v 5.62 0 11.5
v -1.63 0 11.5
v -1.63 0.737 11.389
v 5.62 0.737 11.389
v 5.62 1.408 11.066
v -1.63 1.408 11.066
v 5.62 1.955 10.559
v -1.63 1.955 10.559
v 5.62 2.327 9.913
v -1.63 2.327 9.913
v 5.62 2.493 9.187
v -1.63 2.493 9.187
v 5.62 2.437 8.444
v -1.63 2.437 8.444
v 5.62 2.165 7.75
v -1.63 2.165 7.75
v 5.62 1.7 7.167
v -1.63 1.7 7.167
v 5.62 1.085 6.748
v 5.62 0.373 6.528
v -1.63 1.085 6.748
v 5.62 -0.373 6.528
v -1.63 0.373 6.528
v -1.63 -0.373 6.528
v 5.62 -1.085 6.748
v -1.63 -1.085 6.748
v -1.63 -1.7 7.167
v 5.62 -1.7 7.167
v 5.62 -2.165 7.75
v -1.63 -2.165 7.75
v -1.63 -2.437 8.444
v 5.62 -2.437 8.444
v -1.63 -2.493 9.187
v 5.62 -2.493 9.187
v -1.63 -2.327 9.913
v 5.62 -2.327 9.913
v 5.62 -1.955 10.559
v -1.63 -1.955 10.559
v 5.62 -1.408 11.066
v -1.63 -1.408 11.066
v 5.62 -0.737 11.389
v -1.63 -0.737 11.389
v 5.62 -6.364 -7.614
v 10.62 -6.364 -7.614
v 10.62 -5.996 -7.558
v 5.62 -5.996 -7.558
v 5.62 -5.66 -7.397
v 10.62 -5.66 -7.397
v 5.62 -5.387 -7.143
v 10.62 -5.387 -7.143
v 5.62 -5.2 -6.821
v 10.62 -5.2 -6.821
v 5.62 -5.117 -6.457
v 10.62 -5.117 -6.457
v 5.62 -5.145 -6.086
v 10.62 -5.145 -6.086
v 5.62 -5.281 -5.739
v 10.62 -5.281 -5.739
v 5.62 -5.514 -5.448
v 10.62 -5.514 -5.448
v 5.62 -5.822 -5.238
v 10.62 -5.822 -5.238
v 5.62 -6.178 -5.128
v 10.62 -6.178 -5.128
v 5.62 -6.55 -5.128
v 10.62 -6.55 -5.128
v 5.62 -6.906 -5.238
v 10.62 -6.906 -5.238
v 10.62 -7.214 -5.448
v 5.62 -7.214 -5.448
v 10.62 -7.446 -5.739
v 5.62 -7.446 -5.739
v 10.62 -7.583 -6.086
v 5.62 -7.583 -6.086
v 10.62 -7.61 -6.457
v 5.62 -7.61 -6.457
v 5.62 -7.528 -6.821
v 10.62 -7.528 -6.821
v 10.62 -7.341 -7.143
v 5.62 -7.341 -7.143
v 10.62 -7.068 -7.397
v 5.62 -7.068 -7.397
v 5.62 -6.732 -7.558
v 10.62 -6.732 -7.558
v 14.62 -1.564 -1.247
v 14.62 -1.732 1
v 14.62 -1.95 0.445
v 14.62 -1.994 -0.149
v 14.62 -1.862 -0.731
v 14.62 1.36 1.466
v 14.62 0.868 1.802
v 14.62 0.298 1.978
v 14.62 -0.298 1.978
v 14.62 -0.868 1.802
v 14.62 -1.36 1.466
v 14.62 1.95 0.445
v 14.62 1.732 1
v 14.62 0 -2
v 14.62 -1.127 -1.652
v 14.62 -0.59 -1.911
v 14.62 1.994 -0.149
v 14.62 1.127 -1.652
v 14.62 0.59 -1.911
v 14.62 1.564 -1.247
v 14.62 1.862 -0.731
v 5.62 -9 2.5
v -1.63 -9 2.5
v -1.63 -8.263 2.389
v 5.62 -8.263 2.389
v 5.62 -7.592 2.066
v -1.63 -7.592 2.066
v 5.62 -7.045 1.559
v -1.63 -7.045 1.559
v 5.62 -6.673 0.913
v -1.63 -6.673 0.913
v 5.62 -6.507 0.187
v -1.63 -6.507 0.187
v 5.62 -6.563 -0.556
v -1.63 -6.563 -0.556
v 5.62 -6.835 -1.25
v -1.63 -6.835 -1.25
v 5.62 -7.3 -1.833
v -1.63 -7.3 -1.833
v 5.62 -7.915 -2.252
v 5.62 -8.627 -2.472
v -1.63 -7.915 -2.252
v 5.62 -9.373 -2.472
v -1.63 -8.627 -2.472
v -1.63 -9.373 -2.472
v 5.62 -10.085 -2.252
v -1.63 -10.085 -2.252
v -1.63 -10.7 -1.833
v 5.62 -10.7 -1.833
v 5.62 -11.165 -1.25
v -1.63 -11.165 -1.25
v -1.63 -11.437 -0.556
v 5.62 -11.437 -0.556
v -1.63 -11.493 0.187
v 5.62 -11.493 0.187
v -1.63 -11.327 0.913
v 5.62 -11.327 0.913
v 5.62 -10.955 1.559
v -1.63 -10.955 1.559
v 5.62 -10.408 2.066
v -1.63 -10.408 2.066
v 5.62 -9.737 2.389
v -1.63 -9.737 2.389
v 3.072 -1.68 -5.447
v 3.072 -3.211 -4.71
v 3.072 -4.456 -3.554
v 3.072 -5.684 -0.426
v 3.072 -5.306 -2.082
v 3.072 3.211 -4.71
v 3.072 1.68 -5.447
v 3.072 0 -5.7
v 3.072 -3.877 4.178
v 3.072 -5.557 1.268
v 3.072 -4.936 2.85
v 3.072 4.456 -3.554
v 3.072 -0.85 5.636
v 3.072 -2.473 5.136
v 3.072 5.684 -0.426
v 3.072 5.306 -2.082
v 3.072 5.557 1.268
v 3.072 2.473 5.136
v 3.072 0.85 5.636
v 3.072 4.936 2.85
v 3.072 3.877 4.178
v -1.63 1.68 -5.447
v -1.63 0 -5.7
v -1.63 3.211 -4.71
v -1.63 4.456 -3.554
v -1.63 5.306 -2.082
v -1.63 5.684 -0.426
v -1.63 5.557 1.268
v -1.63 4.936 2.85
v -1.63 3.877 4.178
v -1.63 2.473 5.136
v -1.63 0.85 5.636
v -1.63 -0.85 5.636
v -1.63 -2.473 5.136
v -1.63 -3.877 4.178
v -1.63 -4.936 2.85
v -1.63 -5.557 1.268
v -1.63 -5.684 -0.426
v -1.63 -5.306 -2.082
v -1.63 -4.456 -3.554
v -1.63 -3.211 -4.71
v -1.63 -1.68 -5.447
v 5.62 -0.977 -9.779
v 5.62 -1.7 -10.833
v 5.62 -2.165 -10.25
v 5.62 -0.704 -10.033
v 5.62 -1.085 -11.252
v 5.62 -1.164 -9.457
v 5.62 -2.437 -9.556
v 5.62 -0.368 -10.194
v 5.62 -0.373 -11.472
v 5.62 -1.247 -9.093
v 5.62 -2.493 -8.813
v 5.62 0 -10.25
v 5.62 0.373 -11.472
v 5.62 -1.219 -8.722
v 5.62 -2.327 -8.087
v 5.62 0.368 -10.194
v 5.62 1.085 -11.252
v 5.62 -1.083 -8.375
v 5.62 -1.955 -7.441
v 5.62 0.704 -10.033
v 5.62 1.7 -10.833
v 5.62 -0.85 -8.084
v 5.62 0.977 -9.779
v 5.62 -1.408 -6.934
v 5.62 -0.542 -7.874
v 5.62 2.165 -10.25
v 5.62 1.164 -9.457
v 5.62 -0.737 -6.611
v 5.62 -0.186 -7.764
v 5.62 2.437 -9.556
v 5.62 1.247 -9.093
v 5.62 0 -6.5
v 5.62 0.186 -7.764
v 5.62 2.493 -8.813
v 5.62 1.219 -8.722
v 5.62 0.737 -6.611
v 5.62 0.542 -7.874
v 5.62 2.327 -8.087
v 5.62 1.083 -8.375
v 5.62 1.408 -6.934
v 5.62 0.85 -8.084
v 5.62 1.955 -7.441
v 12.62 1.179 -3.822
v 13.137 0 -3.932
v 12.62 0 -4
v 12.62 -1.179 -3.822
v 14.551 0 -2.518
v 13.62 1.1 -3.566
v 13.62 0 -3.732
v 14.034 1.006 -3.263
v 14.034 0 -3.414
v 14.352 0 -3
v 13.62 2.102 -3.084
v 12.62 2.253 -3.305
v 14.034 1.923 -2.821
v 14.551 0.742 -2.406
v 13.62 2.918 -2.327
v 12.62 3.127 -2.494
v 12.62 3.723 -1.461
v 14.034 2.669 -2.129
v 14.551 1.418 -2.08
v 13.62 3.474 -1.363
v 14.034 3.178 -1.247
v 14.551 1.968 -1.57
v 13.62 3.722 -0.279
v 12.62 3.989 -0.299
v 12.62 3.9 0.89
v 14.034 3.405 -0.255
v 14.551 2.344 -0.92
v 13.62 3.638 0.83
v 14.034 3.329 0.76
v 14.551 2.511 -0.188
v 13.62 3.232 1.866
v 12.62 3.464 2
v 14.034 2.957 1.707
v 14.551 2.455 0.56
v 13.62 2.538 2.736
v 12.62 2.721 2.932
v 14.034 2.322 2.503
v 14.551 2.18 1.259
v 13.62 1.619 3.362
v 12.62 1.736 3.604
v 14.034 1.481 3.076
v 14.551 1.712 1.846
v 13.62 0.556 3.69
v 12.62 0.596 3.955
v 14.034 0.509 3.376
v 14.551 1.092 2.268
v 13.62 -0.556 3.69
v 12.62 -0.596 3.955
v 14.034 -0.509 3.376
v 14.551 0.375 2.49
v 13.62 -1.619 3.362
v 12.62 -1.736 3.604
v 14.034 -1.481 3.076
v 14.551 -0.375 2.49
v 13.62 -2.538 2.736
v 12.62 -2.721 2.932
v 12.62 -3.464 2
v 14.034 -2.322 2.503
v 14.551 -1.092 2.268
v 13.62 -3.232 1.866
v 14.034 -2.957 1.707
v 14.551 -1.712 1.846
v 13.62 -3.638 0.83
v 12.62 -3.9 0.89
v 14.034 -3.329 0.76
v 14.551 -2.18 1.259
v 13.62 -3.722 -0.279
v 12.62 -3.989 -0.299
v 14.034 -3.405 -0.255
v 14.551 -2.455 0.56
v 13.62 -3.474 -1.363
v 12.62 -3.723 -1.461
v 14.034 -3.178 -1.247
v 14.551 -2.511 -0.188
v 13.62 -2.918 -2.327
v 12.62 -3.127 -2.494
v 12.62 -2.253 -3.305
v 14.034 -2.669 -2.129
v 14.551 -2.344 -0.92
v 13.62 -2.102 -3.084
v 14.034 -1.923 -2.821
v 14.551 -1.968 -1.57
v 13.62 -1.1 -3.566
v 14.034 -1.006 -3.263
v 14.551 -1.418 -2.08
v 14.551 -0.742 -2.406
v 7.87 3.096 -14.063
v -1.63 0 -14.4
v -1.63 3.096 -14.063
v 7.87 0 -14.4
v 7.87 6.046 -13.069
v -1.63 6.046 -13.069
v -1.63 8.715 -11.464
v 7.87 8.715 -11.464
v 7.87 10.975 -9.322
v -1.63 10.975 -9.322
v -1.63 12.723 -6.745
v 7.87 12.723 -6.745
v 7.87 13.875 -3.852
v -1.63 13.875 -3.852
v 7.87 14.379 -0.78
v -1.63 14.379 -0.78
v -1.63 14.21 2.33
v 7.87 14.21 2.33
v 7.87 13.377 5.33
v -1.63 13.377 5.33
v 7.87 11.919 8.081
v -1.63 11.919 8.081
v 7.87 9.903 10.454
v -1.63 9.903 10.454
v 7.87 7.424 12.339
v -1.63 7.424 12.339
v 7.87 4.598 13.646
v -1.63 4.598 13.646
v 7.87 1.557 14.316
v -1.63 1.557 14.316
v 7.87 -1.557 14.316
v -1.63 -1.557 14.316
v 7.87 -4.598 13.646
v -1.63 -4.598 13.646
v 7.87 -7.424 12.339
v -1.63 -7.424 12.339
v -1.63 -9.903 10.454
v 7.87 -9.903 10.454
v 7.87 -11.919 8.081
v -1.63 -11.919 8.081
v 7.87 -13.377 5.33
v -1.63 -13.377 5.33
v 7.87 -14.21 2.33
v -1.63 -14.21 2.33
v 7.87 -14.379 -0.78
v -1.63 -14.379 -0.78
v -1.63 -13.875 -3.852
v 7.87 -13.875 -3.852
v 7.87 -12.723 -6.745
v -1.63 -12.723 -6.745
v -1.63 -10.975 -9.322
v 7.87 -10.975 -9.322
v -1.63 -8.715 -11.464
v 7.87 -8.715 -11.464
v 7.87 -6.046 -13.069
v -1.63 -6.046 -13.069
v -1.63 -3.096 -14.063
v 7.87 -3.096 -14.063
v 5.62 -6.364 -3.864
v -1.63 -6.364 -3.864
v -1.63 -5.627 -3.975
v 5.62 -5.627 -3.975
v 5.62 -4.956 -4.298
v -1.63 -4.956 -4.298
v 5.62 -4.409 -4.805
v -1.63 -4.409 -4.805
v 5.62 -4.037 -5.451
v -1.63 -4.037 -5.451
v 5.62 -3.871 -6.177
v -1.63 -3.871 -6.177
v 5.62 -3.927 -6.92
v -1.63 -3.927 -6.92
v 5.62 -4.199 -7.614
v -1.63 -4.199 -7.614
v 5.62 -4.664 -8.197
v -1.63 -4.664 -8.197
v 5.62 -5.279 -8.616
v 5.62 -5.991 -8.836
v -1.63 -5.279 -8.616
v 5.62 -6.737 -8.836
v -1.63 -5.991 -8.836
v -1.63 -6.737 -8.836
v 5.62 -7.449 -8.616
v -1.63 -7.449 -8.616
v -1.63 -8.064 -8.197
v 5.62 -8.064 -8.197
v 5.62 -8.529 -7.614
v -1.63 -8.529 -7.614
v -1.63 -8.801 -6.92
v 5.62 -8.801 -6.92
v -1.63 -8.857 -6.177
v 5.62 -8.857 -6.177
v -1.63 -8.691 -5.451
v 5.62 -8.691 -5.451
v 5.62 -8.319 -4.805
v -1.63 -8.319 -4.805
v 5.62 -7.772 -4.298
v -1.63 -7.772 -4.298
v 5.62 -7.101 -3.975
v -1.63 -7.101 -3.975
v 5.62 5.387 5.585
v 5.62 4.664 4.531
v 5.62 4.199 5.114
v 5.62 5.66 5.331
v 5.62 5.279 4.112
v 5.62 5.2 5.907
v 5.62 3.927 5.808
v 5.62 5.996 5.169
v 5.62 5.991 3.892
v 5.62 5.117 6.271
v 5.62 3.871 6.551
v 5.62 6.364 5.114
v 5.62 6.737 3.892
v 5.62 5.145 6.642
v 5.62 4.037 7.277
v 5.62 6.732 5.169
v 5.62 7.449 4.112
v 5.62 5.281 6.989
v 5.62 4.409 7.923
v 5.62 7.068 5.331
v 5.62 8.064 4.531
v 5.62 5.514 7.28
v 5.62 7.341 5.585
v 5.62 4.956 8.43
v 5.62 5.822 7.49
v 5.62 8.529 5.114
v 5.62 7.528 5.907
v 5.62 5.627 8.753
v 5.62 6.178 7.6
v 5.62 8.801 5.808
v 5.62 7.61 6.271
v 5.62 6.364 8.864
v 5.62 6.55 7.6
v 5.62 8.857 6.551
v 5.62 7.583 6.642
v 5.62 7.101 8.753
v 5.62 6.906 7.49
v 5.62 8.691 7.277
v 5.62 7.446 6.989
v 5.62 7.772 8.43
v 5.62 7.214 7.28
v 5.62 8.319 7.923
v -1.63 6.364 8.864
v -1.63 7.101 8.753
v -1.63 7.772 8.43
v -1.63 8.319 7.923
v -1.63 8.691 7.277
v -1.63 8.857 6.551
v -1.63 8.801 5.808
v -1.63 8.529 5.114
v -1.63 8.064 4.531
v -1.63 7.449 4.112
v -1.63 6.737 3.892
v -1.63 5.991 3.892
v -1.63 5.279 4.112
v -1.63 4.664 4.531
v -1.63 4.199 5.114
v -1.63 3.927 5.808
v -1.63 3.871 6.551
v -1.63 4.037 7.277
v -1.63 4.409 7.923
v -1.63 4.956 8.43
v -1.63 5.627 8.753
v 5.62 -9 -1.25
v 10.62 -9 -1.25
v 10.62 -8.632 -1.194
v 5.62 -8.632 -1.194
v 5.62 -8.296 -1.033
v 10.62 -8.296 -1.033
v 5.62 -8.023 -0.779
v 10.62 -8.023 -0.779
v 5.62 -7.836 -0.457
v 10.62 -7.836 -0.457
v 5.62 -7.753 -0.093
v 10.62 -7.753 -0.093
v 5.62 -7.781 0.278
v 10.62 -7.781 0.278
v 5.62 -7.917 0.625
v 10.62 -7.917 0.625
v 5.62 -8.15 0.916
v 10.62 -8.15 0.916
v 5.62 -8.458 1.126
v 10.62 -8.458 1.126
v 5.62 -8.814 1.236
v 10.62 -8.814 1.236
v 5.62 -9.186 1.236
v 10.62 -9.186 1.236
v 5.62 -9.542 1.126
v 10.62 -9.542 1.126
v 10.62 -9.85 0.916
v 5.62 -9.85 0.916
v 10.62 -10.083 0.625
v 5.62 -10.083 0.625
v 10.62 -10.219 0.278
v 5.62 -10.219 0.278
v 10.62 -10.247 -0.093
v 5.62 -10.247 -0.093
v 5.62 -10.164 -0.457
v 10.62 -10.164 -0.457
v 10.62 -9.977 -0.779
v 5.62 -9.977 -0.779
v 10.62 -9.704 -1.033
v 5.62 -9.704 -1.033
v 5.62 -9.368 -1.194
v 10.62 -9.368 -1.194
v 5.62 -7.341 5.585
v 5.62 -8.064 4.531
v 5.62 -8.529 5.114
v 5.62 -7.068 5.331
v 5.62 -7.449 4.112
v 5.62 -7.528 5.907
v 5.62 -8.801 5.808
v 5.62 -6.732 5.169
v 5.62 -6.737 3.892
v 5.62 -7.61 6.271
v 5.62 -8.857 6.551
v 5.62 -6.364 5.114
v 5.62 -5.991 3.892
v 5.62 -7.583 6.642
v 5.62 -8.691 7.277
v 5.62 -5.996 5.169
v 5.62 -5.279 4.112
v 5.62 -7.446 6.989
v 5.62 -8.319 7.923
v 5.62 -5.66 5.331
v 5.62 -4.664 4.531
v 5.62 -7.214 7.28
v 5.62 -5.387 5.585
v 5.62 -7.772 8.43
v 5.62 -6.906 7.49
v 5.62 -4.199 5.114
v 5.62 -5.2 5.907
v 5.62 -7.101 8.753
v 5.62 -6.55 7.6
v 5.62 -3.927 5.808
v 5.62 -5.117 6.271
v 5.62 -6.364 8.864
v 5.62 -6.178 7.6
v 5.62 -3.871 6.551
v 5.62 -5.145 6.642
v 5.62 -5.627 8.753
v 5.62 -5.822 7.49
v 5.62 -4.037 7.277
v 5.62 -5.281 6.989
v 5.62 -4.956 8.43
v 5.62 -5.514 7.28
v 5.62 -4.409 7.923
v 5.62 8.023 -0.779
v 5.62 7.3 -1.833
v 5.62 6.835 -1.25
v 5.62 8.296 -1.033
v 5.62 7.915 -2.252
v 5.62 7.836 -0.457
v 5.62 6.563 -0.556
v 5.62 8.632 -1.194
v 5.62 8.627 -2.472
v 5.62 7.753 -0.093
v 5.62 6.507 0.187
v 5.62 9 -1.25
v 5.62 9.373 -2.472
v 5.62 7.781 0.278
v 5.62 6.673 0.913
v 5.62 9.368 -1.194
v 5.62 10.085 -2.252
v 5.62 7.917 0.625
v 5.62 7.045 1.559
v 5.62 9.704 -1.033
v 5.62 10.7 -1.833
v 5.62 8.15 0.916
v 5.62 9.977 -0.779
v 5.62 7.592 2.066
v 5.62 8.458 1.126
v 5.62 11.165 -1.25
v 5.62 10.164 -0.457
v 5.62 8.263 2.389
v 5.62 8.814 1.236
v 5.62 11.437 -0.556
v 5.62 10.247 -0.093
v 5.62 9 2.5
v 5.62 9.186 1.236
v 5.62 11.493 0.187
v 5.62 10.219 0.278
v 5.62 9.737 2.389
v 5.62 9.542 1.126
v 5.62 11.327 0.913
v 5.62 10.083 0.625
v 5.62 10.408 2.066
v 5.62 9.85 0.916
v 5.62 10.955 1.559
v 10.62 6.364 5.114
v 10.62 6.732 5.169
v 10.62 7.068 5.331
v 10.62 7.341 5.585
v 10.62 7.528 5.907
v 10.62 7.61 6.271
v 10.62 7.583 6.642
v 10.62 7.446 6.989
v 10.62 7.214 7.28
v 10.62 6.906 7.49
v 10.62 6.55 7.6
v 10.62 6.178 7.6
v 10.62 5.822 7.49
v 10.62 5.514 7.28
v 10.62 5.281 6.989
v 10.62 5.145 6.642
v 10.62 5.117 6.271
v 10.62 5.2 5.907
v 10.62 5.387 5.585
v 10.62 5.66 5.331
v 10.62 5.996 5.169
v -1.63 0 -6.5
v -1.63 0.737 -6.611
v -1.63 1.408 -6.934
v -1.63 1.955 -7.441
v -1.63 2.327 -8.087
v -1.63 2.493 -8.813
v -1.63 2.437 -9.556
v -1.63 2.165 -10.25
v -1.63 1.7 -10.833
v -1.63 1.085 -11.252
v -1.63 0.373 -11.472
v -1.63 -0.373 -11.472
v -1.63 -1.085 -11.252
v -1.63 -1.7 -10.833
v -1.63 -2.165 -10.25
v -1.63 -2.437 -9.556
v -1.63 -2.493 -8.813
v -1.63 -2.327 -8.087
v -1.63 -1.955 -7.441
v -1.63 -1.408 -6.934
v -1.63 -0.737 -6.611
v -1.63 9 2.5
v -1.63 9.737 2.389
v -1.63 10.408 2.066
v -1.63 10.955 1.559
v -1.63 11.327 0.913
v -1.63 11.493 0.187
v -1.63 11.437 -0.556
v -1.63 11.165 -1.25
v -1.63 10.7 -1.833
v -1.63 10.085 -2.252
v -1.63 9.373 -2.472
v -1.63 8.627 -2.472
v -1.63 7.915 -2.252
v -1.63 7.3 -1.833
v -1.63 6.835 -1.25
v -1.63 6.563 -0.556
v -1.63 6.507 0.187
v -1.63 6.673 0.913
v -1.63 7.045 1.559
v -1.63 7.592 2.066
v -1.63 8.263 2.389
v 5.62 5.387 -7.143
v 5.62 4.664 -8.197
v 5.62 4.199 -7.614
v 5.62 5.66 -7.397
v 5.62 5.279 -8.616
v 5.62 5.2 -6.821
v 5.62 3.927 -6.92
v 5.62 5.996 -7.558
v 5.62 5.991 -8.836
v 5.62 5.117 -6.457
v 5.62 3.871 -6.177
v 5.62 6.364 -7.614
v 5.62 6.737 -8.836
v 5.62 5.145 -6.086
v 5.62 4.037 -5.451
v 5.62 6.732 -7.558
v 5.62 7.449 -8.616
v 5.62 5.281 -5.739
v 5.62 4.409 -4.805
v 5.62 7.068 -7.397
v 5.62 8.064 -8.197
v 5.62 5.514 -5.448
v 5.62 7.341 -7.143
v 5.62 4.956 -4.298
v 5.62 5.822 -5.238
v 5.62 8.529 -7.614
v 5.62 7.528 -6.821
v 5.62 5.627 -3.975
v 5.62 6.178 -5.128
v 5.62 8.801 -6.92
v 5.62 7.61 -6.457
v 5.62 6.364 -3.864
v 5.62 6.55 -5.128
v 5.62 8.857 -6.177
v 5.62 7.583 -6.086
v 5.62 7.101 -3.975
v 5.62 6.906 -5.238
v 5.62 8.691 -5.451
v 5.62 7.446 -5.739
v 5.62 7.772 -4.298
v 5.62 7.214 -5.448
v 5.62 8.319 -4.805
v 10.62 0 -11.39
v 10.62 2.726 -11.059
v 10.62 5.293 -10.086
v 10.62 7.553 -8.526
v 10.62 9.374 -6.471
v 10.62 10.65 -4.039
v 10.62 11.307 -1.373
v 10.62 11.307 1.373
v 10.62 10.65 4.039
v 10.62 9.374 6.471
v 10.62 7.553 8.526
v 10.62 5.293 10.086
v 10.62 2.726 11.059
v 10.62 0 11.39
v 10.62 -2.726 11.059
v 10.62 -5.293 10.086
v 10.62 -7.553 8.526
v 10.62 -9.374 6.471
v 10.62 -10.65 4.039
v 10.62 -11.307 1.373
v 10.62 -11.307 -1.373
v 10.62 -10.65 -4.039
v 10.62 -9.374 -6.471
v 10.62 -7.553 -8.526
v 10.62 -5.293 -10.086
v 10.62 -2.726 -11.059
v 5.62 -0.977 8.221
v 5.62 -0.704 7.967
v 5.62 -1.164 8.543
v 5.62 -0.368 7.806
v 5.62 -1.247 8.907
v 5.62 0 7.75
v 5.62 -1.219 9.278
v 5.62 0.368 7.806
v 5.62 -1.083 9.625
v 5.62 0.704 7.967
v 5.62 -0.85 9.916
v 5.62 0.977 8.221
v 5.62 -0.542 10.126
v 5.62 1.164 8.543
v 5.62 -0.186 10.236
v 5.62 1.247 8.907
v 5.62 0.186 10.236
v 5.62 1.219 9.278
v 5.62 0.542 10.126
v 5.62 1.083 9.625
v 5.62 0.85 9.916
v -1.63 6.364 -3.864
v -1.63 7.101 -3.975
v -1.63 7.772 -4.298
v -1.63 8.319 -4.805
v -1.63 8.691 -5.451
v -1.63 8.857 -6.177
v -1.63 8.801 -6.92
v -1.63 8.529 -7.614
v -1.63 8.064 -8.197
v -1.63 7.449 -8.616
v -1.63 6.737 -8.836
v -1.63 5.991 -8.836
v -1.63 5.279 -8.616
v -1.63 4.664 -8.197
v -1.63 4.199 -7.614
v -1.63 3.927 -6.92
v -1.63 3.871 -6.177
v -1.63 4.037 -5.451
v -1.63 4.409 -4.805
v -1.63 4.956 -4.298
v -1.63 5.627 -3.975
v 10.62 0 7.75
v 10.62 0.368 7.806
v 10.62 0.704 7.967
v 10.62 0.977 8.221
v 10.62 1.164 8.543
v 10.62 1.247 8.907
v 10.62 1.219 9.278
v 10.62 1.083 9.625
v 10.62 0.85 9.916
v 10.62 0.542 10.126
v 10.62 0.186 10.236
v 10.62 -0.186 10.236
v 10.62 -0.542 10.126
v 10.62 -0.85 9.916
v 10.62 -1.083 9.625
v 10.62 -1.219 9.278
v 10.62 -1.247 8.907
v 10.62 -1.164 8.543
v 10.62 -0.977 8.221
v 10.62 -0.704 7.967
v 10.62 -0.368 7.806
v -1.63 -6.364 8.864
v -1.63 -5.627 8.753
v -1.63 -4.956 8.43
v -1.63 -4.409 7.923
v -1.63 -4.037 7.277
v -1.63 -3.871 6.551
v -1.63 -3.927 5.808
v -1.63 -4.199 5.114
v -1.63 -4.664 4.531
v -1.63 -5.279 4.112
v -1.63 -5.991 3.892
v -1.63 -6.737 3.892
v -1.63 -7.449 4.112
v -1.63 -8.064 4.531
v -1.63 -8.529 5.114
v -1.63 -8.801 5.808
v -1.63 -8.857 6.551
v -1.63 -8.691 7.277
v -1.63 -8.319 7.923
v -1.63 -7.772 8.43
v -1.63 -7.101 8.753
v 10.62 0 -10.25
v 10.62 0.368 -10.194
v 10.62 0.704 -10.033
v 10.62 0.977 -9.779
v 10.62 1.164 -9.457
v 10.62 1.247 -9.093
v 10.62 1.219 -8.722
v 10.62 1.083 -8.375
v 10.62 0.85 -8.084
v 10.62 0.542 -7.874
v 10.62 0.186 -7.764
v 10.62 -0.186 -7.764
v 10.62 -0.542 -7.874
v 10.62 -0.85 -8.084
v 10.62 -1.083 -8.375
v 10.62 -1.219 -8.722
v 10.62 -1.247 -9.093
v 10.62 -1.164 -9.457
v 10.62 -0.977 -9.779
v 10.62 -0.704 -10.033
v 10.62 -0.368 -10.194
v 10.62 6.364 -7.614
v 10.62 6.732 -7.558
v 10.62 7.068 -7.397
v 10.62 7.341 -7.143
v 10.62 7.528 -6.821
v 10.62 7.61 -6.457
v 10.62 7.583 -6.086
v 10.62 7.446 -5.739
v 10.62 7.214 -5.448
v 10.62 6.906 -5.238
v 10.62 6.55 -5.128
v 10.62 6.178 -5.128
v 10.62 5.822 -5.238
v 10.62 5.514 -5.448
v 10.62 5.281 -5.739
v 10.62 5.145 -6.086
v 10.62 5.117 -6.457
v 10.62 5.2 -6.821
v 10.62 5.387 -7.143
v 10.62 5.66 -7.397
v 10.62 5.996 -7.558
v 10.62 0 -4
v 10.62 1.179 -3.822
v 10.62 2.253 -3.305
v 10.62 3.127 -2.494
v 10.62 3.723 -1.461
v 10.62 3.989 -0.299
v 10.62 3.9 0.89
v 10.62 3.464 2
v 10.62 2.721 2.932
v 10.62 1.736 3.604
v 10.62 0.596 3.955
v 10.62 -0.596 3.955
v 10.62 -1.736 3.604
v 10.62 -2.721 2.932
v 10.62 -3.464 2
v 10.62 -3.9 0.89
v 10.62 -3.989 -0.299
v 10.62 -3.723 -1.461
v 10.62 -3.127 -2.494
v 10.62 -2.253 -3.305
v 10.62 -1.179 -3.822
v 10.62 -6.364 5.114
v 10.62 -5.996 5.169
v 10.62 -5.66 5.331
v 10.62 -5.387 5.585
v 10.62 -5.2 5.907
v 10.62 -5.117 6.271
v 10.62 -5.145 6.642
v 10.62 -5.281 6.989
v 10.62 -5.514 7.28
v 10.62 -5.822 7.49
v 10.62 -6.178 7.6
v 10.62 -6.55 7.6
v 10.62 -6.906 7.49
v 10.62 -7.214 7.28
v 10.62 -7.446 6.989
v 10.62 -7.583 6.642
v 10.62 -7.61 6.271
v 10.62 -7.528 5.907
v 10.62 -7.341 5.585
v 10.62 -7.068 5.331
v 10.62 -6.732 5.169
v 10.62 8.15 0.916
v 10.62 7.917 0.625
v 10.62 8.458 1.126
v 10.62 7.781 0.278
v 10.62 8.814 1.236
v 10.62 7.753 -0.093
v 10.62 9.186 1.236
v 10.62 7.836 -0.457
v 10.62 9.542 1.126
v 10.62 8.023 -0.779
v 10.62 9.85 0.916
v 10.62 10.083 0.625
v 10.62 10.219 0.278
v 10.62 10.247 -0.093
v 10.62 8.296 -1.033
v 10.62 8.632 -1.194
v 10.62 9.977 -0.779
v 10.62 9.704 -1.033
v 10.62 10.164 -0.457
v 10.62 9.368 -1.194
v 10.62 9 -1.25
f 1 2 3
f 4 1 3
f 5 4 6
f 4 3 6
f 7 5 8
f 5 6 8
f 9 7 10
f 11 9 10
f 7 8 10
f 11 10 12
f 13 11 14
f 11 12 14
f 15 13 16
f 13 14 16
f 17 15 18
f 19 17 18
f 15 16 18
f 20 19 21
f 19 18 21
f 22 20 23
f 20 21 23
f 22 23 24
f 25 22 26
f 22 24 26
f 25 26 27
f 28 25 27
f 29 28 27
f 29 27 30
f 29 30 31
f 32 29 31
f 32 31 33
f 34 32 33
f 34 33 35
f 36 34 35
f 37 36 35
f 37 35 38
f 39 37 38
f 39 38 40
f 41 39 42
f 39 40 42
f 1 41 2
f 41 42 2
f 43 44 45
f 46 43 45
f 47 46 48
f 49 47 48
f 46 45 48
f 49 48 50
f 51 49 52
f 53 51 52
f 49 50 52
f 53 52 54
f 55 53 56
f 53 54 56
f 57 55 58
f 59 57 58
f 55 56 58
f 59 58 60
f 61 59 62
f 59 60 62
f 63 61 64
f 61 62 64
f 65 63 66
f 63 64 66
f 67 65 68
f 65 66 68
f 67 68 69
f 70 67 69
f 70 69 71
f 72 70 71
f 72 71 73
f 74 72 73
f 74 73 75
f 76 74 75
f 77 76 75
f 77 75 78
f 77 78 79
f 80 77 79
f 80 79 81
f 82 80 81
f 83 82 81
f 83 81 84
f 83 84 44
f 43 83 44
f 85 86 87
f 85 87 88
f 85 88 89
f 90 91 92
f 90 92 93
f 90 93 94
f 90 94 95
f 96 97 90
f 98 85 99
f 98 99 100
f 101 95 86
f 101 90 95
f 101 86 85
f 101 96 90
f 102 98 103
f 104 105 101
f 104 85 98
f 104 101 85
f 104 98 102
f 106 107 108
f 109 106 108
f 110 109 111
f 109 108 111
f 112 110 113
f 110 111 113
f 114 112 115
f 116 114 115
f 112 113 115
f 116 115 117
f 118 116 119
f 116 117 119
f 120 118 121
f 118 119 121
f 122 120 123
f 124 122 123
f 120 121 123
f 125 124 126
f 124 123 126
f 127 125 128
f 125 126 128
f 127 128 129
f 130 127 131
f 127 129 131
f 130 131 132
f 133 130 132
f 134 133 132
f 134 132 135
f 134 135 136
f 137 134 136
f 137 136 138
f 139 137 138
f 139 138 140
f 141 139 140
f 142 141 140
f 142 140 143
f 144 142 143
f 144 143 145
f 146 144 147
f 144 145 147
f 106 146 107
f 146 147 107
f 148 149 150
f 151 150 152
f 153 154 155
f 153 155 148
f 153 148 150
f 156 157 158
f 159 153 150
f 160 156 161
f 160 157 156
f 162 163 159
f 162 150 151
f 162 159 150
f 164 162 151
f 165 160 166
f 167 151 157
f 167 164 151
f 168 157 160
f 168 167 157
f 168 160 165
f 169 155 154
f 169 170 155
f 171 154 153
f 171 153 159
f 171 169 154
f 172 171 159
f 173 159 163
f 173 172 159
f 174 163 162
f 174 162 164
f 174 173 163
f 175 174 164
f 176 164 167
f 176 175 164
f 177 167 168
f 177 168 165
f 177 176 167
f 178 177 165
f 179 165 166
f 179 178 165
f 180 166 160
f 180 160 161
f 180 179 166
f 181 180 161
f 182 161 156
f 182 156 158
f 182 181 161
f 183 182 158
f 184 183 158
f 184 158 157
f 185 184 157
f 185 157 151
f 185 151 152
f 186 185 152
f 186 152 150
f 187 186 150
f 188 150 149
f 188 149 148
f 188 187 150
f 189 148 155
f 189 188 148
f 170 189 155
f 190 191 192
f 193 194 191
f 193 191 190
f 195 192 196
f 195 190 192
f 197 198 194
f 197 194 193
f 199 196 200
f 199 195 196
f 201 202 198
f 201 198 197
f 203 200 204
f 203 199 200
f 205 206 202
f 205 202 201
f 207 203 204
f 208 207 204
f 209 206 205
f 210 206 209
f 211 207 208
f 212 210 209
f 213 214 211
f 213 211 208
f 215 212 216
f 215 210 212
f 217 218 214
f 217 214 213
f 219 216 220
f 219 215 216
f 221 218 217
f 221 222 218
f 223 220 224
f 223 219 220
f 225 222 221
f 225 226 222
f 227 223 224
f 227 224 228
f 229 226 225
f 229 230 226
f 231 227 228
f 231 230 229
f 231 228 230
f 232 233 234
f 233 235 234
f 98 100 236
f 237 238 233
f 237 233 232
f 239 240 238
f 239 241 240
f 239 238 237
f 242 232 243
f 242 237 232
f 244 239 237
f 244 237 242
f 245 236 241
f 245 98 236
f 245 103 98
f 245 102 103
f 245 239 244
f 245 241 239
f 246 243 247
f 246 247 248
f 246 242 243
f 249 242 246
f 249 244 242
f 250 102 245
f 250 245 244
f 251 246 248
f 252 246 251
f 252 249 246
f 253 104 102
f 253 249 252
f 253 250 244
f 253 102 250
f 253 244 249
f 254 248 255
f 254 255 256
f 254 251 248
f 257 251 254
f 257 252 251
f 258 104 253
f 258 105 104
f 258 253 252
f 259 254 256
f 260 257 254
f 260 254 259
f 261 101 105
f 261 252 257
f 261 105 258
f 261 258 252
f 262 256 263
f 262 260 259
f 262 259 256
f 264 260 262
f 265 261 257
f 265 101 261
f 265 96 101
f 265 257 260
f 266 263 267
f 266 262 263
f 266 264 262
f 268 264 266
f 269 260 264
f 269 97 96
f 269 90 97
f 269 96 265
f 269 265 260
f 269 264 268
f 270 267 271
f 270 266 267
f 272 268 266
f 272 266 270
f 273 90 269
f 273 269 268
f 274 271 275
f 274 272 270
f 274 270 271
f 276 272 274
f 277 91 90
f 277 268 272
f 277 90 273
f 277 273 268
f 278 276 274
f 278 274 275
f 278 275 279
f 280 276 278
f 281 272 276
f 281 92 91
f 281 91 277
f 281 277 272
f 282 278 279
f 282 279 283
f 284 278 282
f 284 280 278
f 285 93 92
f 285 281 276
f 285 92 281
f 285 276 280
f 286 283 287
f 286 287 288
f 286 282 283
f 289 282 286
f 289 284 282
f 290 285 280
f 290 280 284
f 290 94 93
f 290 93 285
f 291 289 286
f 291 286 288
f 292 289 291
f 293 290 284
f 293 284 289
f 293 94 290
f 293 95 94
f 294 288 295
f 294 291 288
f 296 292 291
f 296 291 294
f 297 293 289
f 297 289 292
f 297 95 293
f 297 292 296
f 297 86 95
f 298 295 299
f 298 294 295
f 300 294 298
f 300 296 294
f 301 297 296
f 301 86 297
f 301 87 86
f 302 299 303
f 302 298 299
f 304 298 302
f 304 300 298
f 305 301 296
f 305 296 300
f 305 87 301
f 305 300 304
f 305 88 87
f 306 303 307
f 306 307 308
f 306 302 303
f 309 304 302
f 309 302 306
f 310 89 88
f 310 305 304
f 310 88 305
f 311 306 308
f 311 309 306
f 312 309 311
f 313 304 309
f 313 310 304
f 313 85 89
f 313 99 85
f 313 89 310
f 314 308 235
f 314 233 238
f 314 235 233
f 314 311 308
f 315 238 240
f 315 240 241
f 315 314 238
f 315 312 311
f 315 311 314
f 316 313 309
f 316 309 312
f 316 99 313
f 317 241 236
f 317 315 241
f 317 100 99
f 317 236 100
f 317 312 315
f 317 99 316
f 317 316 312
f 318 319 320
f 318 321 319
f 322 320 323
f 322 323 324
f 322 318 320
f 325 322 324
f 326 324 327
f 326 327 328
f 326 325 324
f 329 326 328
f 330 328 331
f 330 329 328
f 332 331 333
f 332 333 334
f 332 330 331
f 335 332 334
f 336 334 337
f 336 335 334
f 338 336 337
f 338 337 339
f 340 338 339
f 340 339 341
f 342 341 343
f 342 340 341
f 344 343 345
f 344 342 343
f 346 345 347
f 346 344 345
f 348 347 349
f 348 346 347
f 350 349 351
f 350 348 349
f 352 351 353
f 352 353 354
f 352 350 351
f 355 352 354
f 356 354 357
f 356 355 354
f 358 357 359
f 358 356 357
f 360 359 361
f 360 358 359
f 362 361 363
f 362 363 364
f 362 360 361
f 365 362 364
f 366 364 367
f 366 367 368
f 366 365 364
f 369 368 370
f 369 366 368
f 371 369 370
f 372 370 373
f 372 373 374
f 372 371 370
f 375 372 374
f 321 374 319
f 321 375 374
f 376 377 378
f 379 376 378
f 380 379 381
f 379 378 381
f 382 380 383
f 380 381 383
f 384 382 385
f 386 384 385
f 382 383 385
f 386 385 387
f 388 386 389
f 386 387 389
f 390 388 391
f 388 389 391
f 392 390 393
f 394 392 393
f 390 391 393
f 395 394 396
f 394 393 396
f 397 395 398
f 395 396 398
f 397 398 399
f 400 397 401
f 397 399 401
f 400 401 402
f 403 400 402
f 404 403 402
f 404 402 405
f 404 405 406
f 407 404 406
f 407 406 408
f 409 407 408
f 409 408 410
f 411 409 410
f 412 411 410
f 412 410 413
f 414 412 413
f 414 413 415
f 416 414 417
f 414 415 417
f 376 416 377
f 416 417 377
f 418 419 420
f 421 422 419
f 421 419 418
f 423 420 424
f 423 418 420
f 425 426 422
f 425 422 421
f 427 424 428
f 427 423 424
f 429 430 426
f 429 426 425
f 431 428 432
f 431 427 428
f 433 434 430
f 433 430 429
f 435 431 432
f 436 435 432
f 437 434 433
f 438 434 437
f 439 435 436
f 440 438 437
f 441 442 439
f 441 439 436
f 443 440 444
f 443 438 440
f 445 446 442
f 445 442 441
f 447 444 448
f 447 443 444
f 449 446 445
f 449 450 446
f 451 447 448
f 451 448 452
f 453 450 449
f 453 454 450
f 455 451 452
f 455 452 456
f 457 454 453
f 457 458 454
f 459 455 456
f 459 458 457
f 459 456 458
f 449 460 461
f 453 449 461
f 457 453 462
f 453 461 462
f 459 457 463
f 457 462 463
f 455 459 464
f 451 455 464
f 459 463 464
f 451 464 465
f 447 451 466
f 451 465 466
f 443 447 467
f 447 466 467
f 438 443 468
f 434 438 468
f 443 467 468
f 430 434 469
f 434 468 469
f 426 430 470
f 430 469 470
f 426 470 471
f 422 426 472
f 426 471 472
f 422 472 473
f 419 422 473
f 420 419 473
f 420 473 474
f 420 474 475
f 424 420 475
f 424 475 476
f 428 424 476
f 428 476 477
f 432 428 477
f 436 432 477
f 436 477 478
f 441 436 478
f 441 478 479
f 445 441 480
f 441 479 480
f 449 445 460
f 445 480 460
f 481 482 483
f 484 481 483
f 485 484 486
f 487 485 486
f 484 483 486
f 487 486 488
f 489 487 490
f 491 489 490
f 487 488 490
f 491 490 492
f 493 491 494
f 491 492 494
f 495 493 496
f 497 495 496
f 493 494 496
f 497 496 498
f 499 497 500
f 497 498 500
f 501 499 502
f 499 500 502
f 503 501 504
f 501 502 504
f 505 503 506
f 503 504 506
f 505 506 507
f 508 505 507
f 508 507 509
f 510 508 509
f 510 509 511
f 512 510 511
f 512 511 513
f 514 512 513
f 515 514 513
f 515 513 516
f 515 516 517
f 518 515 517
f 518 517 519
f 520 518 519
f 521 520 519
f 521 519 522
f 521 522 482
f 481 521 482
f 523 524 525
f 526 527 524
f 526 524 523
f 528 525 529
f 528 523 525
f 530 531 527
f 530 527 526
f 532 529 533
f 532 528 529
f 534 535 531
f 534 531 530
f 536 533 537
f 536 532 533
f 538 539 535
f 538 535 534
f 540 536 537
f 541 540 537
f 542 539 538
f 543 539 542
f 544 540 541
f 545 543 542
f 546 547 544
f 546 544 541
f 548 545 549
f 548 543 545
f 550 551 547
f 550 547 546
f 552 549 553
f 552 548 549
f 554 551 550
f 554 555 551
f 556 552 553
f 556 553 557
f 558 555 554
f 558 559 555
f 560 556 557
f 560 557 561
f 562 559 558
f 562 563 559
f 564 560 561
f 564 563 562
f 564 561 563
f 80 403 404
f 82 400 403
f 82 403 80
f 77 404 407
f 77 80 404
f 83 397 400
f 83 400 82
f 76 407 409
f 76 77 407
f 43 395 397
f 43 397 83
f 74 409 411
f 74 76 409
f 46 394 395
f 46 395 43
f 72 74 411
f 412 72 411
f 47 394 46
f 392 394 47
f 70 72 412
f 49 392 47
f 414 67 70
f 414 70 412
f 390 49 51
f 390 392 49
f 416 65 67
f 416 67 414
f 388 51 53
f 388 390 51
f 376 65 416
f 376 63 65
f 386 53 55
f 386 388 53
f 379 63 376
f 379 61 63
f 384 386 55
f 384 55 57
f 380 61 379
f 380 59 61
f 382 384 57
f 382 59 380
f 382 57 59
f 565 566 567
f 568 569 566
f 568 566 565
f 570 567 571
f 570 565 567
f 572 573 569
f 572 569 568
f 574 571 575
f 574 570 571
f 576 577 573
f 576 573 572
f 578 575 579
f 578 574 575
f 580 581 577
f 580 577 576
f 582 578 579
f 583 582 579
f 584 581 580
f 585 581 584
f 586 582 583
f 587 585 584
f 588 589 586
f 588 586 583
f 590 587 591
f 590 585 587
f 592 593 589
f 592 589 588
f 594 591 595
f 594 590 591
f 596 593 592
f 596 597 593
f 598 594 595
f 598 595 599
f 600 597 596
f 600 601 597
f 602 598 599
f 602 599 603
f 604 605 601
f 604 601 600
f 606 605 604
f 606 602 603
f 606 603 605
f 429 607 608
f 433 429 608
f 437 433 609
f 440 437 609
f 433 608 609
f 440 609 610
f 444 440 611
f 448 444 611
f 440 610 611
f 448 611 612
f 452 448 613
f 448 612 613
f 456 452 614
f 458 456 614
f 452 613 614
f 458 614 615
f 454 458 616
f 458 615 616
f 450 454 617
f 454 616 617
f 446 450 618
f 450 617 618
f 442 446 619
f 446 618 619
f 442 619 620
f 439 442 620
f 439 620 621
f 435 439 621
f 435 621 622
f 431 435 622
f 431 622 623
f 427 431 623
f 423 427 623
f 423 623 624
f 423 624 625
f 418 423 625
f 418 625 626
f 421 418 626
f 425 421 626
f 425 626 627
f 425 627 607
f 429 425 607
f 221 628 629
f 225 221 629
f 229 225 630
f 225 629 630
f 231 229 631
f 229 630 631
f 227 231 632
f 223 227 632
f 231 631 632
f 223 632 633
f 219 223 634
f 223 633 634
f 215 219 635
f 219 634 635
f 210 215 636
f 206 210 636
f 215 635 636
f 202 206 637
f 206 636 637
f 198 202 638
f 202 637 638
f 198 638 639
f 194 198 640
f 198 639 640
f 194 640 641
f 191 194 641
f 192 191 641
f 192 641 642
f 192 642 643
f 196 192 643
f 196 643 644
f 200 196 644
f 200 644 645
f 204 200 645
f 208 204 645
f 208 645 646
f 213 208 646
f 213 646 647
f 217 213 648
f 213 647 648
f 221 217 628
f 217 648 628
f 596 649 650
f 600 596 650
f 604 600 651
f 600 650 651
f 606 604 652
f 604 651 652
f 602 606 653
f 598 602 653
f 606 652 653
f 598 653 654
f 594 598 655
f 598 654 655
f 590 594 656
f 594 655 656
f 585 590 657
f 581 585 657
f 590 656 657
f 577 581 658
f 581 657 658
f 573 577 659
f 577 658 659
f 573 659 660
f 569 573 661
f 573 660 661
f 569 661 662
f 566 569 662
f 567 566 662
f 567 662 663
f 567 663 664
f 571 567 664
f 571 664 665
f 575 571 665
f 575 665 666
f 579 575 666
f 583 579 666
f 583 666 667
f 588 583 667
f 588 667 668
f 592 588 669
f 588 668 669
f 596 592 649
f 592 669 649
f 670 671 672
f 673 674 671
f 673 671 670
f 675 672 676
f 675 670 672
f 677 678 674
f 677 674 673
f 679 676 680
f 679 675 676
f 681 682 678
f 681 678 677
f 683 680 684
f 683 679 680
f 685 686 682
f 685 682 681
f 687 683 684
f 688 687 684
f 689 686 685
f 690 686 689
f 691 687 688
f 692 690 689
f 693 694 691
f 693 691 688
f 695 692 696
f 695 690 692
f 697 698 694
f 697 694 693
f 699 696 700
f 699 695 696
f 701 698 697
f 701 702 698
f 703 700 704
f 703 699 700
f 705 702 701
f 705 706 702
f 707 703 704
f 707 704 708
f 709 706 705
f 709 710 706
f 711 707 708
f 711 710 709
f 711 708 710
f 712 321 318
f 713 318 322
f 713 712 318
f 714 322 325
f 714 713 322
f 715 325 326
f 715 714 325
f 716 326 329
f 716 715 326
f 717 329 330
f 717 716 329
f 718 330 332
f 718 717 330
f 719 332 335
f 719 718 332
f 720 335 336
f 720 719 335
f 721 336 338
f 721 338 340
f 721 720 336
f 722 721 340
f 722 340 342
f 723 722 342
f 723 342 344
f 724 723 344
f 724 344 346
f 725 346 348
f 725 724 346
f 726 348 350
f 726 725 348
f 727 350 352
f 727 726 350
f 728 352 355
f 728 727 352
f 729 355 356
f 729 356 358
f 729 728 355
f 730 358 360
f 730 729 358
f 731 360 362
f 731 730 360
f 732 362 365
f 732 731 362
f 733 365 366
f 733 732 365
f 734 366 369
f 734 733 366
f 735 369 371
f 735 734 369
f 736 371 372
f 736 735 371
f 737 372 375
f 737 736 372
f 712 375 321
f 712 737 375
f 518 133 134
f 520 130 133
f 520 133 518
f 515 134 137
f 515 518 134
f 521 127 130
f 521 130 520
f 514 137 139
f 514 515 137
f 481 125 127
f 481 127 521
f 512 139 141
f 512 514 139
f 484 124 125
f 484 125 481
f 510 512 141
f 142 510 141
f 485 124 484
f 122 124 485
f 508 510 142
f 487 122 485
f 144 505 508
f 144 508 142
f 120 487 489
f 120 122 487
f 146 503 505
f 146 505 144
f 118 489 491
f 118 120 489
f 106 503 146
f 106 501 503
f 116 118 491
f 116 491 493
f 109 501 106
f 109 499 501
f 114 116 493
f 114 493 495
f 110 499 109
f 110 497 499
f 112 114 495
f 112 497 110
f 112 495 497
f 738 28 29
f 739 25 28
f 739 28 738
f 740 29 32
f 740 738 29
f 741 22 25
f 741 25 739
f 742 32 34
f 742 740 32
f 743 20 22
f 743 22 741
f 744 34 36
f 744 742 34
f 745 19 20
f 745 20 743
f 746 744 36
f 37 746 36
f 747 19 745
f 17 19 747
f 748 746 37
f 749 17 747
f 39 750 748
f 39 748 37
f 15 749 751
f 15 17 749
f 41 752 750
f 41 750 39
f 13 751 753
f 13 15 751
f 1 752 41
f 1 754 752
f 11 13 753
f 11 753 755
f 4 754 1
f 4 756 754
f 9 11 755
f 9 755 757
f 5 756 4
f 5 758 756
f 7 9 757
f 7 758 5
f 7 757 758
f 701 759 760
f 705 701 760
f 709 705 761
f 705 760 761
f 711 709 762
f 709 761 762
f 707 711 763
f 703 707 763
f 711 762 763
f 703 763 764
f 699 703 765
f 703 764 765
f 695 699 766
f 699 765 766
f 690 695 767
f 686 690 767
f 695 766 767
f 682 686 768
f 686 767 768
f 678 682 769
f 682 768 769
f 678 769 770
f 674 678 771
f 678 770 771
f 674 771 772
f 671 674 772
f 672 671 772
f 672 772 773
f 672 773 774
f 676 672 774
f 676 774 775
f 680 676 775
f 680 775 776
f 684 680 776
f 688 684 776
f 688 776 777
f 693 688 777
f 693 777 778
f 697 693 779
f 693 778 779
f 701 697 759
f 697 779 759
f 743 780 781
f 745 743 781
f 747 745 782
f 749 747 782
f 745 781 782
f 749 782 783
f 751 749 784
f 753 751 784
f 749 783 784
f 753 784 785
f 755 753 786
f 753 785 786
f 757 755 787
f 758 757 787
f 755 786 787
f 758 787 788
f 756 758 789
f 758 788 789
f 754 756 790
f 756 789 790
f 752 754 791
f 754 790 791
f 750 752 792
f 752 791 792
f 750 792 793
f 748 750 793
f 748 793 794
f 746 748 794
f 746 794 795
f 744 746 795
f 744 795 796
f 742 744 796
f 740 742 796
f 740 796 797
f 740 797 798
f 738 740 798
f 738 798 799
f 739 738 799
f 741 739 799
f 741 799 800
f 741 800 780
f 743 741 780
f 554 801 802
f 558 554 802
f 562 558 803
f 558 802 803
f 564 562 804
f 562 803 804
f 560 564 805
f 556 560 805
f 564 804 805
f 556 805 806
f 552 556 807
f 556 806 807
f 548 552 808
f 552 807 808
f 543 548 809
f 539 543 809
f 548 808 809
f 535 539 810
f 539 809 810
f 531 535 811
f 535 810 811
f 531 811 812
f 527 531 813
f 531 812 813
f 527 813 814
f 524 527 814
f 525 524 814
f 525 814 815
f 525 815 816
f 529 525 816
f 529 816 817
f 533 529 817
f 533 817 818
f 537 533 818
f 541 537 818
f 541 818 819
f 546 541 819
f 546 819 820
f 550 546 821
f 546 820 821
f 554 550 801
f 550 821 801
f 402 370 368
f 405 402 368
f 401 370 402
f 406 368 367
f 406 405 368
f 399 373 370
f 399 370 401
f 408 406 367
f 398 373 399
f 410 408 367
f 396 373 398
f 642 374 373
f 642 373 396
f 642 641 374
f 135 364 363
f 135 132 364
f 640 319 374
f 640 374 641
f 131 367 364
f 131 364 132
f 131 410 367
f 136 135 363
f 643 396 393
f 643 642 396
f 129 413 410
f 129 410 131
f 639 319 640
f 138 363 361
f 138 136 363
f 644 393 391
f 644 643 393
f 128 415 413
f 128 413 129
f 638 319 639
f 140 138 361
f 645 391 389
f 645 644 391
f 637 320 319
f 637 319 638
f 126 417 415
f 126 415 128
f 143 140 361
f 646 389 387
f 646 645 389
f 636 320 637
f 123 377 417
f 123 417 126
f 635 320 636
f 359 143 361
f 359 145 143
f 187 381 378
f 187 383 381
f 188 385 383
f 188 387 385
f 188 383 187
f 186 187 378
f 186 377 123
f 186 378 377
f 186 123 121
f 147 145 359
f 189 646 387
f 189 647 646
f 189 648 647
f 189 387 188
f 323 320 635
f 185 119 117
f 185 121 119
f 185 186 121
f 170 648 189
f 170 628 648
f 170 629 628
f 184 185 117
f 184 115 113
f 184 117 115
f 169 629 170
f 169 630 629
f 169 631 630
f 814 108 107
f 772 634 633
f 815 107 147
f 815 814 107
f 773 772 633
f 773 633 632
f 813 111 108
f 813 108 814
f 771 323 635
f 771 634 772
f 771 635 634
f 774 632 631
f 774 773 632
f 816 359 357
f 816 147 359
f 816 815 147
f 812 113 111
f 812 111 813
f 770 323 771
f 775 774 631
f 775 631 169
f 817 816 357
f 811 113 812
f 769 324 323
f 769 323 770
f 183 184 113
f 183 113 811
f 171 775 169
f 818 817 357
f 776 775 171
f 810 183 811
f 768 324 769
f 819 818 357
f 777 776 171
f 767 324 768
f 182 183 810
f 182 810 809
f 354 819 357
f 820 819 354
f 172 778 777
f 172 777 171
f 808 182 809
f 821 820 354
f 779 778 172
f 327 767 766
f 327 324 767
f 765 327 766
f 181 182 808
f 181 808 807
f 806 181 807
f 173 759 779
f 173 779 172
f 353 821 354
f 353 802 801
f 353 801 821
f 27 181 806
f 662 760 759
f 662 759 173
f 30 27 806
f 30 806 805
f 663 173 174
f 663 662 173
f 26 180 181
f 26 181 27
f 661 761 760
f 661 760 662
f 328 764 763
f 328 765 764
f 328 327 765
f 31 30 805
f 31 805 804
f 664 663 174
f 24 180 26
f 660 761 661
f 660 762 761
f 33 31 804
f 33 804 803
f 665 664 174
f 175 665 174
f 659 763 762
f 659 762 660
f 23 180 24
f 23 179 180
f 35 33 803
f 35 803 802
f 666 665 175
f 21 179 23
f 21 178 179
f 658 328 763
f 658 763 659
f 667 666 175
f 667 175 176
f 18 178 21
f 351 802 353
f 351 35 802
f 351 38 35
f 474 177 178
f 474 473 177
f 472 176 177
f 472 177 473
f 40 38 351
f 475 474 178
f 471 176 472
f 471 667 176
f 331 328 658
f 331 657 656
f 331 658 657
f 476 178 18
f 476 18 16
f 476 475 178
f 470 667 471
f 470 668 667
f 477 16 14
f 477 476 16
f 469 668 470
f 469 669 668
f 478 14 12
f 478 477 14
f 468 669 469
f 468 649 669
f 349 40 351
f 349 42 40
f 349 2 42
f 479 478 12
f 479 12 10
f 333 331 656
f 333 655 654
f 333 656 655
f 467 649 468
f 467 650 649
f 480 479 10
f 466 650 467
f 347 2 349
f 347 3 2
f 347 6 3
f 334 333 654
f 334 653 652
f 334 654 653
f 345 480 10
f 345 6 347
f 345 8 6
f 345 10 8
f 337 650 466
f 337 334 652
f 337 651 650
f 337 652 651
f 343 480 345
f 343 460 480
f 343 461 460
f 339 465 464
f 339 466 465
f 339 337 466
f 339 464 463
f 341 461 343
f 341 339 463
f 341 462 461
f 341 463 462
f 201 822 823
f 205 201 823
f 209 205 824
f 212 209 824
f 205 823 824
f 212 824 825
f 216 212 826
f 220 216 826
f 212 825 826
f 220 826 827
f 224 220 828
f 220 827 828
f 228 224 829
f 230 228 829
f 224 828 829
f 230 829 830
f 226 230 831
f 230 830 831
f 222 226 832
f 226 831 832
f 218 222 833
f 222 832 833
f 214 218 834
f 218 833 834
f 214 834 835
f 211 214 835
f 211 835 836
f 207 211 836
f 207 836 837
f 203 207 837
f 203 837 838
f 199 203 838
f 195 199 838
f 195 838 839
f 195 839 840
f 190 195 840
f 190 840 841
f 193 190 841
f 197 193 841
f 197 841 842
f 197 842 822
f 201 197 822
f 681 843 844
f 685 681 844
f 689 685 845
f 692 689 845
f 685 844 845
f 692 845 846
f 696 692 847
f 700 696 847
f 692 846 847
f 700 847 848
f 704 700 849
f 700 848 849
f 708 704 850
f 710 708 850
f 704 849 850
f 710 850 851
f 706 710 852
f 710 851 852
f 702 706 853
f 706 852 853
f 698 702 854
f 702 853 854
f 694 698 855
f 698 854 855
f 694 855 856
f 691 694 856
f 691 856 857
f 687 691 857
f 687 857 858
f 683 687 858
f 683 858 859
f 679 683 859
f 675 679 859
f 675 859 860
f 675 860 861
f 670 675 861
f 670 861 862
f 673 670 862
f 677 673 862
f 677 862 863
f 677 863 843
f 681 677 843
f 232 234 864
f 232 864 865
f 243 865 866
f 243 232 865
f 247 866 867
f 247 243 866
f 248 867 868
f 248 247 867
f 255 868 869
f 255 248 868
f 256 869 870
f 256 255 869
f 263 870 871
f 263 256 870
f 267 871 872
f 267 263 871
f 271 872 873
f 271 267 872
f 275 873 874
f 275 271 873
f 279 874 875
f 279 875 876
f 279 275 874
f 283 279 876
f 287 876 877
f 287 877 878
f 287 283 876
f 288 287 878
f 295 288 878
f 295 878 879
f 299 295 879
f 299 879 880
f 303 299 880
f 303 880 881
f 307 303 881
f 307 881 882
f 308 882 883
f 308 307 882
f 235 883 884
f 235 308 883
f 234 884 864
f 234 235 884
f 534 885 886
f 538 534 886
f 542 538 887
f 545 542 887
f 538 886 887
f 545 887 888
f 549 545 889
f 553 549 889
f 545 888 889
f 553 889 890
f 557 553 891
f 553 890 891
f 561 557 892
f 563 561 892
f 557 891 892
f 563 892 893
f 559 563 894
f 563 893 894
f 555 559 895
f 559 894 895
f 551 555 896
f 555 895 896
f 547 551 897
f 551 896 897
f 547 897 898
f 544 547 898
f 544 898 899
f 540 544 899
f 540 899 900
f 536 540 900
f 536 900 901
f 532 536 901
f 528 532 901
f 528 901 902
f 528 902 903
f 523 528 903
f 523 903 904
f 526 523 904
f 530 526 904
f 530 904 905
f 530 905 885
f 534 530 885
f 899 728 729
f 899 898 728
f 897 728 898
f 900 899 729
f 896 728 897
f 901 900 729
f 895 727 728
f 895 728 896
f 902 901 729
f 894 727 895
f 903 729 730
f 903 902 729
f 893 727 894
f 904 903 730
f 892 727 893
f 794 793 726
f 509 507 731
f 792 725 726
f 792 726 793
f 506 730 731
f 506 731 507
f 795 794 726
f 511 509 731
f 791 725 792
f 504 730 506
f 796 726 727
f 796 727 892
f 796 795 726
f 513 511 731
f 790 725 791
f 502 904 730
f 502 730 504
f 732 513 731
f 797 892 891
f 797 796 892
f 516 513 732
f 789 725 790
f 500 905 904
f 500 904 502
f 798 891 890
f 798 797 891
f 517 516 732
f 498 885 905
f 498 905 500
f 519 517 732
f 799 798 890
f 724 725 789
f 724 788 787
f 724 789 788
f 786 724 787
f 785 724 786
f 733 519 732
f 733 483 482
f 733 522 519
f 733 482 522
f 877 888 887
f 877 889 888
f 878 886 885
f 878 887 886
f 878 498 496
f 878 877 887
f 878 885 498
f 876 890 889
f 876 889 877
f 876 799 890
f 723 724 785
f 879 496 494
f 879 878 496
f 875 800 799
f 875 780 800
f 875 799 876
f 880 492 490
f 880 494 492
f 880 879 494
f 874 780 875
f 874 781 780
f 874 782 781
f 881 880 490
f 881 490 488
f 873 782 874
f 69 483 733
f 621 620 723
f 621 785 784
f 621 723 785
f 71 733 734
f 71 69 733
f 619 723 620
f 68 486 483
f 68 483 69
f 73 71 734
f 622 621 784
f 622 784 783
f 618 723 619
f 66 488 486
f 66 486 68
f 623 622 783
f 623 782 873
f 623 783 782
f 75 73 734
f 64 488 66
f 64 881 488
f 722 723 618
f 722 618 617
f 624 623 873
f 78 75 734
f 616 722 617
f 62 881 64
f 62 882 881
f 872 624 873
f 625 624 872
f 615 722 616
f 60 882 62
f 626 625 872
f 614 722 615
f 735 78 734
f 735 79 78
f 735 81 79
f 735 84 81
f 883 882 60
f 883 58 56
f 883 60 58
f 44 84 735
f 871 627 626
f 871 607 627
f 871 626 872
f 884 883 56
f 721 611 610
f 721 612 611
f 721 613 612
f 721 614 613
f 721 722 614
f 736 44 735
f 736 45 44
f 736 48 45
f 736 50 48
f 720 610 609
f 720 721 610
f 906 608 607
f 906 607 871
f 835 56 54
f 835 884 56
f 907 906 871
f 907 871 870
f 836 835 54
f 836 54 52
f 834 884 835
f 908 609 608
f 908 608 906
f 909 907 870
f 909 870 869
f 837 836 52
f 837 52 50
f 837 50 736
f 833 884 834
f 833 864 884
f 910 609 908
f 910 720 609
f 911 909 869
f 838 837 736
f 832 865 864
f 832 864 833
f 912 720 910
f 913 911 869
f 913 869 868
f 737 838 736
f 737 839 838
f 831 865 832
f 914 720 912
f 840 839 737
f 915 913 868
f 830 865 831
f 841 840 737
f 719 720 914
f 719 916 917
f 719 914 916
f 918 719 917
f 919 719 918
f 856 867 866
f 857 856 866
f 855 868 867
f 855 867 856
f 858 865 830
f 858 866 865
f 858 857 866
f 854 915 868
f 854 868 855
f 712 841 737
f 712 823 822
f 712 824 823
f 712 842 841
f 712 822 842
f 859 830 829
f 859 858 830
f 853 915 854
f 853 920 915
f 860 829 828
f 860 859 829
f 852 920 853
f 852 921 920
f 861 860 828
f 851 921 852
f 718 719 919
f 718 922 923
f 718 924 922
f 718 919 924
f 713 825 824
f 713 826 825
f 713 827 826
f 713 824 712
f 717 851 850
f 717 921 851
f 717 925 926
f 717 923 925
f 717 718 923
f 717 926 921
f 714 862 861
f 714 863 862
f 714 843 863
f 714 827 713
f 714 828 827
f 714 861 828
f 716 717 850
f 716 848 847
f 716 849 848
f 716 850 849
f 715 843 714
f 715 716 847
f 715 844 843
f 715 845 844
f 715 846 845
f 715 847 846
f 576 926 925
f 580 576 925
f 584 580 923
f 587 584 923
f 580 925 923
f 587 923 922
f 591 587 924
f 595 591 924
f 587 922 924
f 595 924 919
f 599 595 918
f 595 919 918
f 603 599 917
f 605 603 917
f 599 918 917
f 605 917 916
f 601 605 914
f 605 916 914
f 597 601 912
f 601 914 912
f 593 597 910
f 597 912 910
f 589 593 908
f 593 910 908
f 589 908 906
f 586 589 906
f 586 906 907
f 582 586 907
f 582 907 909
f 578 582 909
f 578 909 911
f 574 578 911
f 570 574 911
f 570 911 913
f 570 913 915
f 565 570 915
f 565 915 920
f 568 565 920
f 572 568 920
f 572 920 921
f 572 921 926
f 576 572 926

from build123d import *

# Parameters (mm, degrees)
FILLET1_R          = 2
SKETCH2_R          = 1.25
CUT_EXTRUDE1_DEPTH = 12.25
SKETCH3_R          = 2.5
CUT_EXTRUDE2_DEPTH = 7.25


with BuildPart() as part:
    # Sketch1 → Revolve1 (revolve)
    with BuildSketch(Plane(origin=(0, 0, 0), x_dir=(1, 0, 0), z_dir=(0, 1, 0))):
        Polygon((-1.630434783, 14.4), (7.869565217, 14.4), (10.619565217, 11.390476118), (10.619565217, 4), (14.619565217, 4), (14.619565217, 0), (13.372742768, 0), (3.071692396, 0), (3.071692396, 5.7), (-1.630434783, 5.7), align=None)
    revolve(axis=Axis((-12.391304348, 0, 0), (1, 0, 0)))

    # Fillet1
    fillet1_edges = [part.edges().sort_by_distance(p)[0] for p in [
        (14.619565217, 0, 4),
    ]]
    fillet(fillet1_edges, radius=FILLET1_R)

    # Sketch2 → Cut-Extrude1 (cut)
    with BuildSketch(Plane(origin=(10.619565217, 0, 0), x_dir=(0, 0, -1), z_dir=(1, 0, 0))):
        with Locations((0, 9)):
            Circle(SKETCH2_R)
        with Locations((6.363961031, 6.363961031)):
            Circle(SKETCH2_R)
        with Locations((9, 0)):
            Circle(SKETCH2_R)
        with Locations((6.363961031, -6.363961031)):
            Circle(SKETCH2_R)
        with Locations((0, -9)):
            Circle(SKETCH2_R)
        with Locations((-6.363961031, -6.363961031)):
            Circle(SKETCH2_R)
        with Locations((-9, 0)):
            Circle(SKETCH2_R)
        with Locations((-6.363961031, 6.363961031)):
            Circle(SKETCH2_R)
    extrude(amount=-CUT_EXTRUDE1_DEPTH, mode=Mode.SUBTRACT)

    # Sketch3 → Cut-Extrude2 (cut)
    with BuildSketch(Plane.ZY.offset(1.630434783)):
        with Locations((0, 9)):
            Circle(SKETCH3_R)
        with Locations((6.363961031, 6.363961031)):
            Circle(SKETCH3_R)
        with Locations((9, 0)):
            Circle(SKETCH3_R)
        with Locations((6.363961031, -6.363961031)):
            Circle(SKETCH3_R)
        with Locations((0, -9)):
            Circle(SKETCH3_R)
        with Locations((-6.363961031, -6.363961031)):
            Circle(SKETCH3_R)
        with Locations((-9, 0)):
            Circle(SKETCH3_R)
        with Locations((-6.363961031, 6.363961031)):
            Circle(SKETCH3_R)
    extrude(amount=-CUT_EXTRUDE2_DEPTH, mode=Mode.SUBTRACT)


solid = part.part
